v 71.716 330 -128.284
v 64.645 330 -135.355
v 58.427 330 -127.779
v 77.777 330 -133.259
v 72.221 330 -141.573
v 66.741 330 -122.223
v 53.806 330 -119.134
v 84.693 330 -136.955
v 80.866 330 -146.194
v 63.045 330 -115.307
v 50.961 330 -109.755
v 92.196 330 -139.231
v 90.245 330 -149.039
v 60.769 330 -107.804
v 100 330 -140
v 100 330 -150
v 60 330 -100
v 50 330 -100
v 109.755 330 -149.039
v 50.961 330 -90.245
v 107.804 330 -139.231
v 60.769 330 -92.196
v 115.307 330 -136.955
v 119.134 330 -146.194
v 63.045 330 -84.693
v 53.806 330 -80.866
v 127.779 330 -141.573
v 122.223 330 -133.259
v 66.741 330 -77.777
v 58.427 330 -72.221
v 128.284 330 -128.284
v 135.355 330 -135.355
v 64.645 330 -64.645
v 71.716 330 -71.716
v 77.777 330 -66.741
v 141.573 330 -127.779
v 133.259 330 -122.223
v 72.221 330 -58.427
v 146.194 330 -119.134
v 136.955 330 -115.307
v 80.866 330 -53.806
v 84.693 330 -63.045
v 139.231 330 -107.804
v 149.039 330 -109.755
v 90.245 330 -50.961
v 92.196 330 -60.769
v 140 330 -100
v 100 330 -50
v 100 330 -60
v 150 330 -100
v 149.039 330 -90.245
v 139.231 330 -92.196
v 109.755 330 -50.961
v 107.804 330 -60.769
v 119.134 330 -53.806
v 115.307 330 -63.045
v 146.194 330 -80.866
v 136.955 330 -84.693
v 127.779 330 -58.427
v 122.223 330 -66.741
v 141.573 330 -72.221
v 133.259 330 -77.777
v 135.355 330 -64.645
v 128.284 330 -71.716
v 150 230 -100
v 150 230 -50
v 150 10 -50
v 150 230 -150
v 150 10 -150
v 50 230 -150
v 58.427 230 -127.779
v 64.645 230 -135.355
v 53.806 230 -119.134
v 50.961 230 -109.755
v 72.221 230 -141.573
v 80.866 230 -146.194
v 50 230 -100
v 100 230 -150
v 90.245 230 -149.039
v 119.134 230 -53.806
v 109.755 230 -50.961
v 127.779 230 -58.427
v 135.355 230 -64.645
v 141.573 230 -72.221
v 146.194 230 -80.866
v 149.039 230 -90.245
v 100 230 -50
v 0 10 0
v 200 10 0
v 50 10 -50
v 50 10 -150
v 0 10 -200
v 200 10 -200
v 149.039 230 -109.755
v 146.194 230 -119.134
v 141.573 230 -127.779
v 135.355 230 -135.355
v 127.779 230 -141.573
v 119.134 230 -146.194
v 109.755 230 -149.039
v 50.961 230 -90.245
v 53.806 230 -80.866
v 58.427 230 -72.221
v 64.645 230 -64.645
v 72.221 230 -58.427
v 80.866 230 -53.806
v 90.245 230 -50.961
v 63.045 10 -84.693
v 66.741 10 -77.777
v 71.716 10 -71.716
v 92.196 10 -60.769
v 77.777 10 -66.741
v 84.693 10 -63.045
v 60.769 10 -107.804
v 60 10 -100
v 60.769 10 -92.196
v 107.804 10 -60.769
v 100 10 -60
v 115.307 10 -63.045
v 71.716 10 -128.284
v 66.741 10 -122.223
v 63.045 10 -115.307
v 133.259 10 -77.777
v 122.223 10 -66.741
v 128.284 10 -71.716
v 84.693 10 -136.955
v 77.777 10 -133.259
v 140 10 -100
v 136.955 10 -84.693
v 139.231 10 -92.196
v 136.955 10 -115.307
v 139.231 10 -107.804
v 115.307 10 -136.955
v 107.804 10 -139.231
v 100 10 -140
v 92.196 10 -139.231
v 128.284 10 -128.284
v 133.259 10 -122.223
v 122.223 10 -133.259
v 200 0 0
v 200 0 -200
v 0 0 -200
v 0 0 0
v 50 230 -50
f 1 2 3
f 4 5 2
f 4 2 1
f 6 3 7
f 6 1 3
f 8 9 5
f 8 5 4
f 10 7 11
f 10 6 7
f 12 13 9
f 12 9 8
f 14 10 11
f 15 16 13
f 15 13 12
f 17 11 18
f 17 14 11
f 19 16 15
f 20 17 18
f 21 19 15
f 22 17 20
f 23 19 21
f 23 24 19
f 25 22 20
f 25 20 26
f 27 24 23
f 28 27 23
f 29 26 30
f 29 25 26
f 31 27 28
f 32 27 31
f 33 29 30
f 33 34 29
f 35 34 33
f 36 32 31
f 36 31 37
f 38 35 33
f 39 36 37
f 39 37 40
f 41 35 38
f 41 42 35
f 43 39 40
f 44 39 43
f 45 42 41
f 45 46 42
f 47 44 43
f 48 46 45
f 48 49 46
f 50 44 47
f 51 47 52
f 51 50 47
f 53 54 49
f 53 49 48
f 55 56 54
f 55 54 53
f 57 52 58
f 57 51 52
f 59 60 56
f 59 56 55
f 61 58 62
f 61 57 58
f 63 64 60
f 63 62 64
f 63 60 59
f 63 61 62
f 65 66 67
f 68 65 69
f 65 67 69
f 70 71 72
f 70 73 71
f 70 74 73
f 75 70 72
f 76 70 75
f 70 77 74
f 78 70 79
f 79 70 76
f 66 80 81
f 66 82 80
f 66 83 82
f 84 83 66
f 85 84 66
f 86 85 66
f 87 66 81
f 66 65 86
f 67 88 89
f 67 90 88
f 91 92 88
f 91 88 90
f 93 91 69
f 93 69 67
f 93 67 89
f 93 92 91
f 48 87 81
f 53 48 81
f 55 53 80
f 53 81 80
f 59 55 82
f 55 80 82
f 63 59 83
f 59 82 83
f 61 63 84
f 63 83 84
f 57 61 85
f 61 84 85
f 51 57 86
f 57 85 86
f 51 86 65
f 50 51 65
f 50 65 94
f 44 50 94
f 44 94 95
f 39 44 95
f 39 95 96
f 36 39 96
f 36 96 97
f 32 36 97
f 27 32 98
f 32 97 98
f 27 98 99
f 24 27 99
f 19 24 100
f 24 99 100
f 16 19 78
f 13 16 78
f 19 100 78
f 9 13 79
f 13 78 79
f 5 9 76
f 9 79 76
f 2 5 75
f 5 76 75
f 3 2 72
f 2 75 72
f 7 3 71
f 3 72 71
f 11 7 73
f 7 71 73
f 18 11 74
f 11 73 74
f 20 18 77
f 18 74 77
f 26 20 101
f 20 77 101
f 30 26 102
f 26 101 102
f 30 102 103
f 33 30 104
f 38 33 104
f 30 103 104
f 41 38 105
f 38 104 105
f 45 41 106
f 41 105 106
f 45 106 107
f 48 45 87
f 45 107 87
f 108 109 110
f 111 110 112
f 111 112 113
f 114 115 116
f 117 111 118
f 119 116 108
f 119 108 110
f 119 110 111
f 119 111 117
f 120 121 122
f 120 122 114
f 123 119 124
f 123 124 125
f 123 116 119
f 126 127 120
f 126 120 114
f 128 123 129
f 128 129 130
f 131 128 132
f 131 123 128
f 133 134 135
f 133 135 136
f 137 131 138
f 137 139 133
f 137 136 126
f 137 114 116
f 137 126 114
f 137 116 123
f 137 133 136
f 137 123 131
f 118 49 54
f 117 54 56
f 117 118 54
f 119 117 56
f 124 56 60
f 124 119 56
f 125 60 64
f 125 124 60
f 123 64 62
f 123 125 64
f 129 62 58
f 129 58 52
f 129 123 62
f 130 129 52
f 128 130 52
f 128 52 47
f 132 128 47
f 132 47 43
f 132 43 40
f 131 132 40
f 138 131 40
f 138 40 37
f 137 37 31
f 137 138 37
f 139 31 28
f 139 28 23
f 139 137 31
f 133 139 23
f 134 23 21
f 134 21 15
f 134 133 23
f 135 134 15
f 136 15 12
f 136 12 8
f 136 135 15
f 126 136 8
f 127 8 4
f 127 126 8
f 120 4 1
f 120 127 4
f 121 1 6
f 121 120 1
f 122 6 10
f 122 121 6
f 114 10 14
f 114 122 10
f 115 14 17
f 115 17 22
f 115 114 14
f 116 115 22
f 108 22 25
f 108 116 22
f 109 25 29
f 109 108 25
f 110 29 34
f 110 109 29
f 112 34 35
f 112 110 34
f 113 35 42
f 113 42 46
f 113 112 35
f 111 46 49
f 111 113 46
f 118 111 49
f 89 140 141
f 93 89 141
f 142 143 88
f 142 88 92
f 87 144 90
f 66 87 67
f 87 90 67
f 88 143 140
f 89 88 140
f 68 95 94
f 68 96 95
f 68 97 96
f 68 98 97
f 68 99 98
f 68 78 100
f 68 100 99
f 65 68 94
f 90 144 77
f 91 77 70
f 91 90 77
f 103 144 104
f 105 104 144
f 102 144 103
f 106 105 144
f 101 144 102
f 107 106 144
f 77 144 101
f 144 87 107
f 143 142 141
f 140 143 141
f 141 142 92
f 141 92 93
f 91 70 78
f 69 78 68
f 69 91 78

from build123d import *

# Parameters (mm, degrees)
SKETCH1_W           = 200
SKETCH1_H           = 200
BOSS_EXTRUDE1_DEPTH = 10
SKETCH2_W           = 100
SKETCH2_H           = 100
SKETCH2_R           = 40
BOSS_EXTRUDE2_DEPTH = 220
SKETCH3_R           = 50
SKETCH3_R_2         = 40
BOSS_EXTRUDE3_DEPTH = 100


with BuildPart() as part:
    # Sketch1 → Boss-Extrude1 (new body)
    with BuildSketch(Plane(origin=(0, 0, 0), x_dir=(1, 0, 0), z_dir=(0, 1, 0))):
        with Locations((100, 100)):
            Rectangle(SKETCH1_W, SKETCH1_H)
    extrude(amount=BOSS_EXTRUDE1_DEPTH)

    # Sketch2 → Boss-Extrude2 (add)
    with BuildSketch(Plane(origin=(0, 10, 0), x_dir=(1, 0, 0), z_dir=(0, 1, 0))):
        with Locations((100, 100)):
            Rectangle(SKETCH2_W, SKETCH2_H)
        with Locations(Location((100, 100, 0), (0, 0, 270))):
            Circle(SKETCH2_R, mode=Mode.SUBTRACT)
    extrude(amount=BOSS_EXTRUDE2_DEPTH)

    # Sketch3 → Boss-Extrude3 (add)
    with BuildSketch(Plane(origin=(0, 230, 0), x_dir=(1, 0, 0), z_dir=(0, 1, 0))):
        with Locations(Location((100, 100, 0), (0, 0, 270))):
            Circle(SKETCH3_R)
        with Locations(Location((100, 100, 0), (0, 0, 270))):
            Circle(SKETCH3_R_2, mode=Mode.SUBTRACT)
    extrude(amount=BOSS_EXTRUDE3_DEPTH)


solid = part.part
